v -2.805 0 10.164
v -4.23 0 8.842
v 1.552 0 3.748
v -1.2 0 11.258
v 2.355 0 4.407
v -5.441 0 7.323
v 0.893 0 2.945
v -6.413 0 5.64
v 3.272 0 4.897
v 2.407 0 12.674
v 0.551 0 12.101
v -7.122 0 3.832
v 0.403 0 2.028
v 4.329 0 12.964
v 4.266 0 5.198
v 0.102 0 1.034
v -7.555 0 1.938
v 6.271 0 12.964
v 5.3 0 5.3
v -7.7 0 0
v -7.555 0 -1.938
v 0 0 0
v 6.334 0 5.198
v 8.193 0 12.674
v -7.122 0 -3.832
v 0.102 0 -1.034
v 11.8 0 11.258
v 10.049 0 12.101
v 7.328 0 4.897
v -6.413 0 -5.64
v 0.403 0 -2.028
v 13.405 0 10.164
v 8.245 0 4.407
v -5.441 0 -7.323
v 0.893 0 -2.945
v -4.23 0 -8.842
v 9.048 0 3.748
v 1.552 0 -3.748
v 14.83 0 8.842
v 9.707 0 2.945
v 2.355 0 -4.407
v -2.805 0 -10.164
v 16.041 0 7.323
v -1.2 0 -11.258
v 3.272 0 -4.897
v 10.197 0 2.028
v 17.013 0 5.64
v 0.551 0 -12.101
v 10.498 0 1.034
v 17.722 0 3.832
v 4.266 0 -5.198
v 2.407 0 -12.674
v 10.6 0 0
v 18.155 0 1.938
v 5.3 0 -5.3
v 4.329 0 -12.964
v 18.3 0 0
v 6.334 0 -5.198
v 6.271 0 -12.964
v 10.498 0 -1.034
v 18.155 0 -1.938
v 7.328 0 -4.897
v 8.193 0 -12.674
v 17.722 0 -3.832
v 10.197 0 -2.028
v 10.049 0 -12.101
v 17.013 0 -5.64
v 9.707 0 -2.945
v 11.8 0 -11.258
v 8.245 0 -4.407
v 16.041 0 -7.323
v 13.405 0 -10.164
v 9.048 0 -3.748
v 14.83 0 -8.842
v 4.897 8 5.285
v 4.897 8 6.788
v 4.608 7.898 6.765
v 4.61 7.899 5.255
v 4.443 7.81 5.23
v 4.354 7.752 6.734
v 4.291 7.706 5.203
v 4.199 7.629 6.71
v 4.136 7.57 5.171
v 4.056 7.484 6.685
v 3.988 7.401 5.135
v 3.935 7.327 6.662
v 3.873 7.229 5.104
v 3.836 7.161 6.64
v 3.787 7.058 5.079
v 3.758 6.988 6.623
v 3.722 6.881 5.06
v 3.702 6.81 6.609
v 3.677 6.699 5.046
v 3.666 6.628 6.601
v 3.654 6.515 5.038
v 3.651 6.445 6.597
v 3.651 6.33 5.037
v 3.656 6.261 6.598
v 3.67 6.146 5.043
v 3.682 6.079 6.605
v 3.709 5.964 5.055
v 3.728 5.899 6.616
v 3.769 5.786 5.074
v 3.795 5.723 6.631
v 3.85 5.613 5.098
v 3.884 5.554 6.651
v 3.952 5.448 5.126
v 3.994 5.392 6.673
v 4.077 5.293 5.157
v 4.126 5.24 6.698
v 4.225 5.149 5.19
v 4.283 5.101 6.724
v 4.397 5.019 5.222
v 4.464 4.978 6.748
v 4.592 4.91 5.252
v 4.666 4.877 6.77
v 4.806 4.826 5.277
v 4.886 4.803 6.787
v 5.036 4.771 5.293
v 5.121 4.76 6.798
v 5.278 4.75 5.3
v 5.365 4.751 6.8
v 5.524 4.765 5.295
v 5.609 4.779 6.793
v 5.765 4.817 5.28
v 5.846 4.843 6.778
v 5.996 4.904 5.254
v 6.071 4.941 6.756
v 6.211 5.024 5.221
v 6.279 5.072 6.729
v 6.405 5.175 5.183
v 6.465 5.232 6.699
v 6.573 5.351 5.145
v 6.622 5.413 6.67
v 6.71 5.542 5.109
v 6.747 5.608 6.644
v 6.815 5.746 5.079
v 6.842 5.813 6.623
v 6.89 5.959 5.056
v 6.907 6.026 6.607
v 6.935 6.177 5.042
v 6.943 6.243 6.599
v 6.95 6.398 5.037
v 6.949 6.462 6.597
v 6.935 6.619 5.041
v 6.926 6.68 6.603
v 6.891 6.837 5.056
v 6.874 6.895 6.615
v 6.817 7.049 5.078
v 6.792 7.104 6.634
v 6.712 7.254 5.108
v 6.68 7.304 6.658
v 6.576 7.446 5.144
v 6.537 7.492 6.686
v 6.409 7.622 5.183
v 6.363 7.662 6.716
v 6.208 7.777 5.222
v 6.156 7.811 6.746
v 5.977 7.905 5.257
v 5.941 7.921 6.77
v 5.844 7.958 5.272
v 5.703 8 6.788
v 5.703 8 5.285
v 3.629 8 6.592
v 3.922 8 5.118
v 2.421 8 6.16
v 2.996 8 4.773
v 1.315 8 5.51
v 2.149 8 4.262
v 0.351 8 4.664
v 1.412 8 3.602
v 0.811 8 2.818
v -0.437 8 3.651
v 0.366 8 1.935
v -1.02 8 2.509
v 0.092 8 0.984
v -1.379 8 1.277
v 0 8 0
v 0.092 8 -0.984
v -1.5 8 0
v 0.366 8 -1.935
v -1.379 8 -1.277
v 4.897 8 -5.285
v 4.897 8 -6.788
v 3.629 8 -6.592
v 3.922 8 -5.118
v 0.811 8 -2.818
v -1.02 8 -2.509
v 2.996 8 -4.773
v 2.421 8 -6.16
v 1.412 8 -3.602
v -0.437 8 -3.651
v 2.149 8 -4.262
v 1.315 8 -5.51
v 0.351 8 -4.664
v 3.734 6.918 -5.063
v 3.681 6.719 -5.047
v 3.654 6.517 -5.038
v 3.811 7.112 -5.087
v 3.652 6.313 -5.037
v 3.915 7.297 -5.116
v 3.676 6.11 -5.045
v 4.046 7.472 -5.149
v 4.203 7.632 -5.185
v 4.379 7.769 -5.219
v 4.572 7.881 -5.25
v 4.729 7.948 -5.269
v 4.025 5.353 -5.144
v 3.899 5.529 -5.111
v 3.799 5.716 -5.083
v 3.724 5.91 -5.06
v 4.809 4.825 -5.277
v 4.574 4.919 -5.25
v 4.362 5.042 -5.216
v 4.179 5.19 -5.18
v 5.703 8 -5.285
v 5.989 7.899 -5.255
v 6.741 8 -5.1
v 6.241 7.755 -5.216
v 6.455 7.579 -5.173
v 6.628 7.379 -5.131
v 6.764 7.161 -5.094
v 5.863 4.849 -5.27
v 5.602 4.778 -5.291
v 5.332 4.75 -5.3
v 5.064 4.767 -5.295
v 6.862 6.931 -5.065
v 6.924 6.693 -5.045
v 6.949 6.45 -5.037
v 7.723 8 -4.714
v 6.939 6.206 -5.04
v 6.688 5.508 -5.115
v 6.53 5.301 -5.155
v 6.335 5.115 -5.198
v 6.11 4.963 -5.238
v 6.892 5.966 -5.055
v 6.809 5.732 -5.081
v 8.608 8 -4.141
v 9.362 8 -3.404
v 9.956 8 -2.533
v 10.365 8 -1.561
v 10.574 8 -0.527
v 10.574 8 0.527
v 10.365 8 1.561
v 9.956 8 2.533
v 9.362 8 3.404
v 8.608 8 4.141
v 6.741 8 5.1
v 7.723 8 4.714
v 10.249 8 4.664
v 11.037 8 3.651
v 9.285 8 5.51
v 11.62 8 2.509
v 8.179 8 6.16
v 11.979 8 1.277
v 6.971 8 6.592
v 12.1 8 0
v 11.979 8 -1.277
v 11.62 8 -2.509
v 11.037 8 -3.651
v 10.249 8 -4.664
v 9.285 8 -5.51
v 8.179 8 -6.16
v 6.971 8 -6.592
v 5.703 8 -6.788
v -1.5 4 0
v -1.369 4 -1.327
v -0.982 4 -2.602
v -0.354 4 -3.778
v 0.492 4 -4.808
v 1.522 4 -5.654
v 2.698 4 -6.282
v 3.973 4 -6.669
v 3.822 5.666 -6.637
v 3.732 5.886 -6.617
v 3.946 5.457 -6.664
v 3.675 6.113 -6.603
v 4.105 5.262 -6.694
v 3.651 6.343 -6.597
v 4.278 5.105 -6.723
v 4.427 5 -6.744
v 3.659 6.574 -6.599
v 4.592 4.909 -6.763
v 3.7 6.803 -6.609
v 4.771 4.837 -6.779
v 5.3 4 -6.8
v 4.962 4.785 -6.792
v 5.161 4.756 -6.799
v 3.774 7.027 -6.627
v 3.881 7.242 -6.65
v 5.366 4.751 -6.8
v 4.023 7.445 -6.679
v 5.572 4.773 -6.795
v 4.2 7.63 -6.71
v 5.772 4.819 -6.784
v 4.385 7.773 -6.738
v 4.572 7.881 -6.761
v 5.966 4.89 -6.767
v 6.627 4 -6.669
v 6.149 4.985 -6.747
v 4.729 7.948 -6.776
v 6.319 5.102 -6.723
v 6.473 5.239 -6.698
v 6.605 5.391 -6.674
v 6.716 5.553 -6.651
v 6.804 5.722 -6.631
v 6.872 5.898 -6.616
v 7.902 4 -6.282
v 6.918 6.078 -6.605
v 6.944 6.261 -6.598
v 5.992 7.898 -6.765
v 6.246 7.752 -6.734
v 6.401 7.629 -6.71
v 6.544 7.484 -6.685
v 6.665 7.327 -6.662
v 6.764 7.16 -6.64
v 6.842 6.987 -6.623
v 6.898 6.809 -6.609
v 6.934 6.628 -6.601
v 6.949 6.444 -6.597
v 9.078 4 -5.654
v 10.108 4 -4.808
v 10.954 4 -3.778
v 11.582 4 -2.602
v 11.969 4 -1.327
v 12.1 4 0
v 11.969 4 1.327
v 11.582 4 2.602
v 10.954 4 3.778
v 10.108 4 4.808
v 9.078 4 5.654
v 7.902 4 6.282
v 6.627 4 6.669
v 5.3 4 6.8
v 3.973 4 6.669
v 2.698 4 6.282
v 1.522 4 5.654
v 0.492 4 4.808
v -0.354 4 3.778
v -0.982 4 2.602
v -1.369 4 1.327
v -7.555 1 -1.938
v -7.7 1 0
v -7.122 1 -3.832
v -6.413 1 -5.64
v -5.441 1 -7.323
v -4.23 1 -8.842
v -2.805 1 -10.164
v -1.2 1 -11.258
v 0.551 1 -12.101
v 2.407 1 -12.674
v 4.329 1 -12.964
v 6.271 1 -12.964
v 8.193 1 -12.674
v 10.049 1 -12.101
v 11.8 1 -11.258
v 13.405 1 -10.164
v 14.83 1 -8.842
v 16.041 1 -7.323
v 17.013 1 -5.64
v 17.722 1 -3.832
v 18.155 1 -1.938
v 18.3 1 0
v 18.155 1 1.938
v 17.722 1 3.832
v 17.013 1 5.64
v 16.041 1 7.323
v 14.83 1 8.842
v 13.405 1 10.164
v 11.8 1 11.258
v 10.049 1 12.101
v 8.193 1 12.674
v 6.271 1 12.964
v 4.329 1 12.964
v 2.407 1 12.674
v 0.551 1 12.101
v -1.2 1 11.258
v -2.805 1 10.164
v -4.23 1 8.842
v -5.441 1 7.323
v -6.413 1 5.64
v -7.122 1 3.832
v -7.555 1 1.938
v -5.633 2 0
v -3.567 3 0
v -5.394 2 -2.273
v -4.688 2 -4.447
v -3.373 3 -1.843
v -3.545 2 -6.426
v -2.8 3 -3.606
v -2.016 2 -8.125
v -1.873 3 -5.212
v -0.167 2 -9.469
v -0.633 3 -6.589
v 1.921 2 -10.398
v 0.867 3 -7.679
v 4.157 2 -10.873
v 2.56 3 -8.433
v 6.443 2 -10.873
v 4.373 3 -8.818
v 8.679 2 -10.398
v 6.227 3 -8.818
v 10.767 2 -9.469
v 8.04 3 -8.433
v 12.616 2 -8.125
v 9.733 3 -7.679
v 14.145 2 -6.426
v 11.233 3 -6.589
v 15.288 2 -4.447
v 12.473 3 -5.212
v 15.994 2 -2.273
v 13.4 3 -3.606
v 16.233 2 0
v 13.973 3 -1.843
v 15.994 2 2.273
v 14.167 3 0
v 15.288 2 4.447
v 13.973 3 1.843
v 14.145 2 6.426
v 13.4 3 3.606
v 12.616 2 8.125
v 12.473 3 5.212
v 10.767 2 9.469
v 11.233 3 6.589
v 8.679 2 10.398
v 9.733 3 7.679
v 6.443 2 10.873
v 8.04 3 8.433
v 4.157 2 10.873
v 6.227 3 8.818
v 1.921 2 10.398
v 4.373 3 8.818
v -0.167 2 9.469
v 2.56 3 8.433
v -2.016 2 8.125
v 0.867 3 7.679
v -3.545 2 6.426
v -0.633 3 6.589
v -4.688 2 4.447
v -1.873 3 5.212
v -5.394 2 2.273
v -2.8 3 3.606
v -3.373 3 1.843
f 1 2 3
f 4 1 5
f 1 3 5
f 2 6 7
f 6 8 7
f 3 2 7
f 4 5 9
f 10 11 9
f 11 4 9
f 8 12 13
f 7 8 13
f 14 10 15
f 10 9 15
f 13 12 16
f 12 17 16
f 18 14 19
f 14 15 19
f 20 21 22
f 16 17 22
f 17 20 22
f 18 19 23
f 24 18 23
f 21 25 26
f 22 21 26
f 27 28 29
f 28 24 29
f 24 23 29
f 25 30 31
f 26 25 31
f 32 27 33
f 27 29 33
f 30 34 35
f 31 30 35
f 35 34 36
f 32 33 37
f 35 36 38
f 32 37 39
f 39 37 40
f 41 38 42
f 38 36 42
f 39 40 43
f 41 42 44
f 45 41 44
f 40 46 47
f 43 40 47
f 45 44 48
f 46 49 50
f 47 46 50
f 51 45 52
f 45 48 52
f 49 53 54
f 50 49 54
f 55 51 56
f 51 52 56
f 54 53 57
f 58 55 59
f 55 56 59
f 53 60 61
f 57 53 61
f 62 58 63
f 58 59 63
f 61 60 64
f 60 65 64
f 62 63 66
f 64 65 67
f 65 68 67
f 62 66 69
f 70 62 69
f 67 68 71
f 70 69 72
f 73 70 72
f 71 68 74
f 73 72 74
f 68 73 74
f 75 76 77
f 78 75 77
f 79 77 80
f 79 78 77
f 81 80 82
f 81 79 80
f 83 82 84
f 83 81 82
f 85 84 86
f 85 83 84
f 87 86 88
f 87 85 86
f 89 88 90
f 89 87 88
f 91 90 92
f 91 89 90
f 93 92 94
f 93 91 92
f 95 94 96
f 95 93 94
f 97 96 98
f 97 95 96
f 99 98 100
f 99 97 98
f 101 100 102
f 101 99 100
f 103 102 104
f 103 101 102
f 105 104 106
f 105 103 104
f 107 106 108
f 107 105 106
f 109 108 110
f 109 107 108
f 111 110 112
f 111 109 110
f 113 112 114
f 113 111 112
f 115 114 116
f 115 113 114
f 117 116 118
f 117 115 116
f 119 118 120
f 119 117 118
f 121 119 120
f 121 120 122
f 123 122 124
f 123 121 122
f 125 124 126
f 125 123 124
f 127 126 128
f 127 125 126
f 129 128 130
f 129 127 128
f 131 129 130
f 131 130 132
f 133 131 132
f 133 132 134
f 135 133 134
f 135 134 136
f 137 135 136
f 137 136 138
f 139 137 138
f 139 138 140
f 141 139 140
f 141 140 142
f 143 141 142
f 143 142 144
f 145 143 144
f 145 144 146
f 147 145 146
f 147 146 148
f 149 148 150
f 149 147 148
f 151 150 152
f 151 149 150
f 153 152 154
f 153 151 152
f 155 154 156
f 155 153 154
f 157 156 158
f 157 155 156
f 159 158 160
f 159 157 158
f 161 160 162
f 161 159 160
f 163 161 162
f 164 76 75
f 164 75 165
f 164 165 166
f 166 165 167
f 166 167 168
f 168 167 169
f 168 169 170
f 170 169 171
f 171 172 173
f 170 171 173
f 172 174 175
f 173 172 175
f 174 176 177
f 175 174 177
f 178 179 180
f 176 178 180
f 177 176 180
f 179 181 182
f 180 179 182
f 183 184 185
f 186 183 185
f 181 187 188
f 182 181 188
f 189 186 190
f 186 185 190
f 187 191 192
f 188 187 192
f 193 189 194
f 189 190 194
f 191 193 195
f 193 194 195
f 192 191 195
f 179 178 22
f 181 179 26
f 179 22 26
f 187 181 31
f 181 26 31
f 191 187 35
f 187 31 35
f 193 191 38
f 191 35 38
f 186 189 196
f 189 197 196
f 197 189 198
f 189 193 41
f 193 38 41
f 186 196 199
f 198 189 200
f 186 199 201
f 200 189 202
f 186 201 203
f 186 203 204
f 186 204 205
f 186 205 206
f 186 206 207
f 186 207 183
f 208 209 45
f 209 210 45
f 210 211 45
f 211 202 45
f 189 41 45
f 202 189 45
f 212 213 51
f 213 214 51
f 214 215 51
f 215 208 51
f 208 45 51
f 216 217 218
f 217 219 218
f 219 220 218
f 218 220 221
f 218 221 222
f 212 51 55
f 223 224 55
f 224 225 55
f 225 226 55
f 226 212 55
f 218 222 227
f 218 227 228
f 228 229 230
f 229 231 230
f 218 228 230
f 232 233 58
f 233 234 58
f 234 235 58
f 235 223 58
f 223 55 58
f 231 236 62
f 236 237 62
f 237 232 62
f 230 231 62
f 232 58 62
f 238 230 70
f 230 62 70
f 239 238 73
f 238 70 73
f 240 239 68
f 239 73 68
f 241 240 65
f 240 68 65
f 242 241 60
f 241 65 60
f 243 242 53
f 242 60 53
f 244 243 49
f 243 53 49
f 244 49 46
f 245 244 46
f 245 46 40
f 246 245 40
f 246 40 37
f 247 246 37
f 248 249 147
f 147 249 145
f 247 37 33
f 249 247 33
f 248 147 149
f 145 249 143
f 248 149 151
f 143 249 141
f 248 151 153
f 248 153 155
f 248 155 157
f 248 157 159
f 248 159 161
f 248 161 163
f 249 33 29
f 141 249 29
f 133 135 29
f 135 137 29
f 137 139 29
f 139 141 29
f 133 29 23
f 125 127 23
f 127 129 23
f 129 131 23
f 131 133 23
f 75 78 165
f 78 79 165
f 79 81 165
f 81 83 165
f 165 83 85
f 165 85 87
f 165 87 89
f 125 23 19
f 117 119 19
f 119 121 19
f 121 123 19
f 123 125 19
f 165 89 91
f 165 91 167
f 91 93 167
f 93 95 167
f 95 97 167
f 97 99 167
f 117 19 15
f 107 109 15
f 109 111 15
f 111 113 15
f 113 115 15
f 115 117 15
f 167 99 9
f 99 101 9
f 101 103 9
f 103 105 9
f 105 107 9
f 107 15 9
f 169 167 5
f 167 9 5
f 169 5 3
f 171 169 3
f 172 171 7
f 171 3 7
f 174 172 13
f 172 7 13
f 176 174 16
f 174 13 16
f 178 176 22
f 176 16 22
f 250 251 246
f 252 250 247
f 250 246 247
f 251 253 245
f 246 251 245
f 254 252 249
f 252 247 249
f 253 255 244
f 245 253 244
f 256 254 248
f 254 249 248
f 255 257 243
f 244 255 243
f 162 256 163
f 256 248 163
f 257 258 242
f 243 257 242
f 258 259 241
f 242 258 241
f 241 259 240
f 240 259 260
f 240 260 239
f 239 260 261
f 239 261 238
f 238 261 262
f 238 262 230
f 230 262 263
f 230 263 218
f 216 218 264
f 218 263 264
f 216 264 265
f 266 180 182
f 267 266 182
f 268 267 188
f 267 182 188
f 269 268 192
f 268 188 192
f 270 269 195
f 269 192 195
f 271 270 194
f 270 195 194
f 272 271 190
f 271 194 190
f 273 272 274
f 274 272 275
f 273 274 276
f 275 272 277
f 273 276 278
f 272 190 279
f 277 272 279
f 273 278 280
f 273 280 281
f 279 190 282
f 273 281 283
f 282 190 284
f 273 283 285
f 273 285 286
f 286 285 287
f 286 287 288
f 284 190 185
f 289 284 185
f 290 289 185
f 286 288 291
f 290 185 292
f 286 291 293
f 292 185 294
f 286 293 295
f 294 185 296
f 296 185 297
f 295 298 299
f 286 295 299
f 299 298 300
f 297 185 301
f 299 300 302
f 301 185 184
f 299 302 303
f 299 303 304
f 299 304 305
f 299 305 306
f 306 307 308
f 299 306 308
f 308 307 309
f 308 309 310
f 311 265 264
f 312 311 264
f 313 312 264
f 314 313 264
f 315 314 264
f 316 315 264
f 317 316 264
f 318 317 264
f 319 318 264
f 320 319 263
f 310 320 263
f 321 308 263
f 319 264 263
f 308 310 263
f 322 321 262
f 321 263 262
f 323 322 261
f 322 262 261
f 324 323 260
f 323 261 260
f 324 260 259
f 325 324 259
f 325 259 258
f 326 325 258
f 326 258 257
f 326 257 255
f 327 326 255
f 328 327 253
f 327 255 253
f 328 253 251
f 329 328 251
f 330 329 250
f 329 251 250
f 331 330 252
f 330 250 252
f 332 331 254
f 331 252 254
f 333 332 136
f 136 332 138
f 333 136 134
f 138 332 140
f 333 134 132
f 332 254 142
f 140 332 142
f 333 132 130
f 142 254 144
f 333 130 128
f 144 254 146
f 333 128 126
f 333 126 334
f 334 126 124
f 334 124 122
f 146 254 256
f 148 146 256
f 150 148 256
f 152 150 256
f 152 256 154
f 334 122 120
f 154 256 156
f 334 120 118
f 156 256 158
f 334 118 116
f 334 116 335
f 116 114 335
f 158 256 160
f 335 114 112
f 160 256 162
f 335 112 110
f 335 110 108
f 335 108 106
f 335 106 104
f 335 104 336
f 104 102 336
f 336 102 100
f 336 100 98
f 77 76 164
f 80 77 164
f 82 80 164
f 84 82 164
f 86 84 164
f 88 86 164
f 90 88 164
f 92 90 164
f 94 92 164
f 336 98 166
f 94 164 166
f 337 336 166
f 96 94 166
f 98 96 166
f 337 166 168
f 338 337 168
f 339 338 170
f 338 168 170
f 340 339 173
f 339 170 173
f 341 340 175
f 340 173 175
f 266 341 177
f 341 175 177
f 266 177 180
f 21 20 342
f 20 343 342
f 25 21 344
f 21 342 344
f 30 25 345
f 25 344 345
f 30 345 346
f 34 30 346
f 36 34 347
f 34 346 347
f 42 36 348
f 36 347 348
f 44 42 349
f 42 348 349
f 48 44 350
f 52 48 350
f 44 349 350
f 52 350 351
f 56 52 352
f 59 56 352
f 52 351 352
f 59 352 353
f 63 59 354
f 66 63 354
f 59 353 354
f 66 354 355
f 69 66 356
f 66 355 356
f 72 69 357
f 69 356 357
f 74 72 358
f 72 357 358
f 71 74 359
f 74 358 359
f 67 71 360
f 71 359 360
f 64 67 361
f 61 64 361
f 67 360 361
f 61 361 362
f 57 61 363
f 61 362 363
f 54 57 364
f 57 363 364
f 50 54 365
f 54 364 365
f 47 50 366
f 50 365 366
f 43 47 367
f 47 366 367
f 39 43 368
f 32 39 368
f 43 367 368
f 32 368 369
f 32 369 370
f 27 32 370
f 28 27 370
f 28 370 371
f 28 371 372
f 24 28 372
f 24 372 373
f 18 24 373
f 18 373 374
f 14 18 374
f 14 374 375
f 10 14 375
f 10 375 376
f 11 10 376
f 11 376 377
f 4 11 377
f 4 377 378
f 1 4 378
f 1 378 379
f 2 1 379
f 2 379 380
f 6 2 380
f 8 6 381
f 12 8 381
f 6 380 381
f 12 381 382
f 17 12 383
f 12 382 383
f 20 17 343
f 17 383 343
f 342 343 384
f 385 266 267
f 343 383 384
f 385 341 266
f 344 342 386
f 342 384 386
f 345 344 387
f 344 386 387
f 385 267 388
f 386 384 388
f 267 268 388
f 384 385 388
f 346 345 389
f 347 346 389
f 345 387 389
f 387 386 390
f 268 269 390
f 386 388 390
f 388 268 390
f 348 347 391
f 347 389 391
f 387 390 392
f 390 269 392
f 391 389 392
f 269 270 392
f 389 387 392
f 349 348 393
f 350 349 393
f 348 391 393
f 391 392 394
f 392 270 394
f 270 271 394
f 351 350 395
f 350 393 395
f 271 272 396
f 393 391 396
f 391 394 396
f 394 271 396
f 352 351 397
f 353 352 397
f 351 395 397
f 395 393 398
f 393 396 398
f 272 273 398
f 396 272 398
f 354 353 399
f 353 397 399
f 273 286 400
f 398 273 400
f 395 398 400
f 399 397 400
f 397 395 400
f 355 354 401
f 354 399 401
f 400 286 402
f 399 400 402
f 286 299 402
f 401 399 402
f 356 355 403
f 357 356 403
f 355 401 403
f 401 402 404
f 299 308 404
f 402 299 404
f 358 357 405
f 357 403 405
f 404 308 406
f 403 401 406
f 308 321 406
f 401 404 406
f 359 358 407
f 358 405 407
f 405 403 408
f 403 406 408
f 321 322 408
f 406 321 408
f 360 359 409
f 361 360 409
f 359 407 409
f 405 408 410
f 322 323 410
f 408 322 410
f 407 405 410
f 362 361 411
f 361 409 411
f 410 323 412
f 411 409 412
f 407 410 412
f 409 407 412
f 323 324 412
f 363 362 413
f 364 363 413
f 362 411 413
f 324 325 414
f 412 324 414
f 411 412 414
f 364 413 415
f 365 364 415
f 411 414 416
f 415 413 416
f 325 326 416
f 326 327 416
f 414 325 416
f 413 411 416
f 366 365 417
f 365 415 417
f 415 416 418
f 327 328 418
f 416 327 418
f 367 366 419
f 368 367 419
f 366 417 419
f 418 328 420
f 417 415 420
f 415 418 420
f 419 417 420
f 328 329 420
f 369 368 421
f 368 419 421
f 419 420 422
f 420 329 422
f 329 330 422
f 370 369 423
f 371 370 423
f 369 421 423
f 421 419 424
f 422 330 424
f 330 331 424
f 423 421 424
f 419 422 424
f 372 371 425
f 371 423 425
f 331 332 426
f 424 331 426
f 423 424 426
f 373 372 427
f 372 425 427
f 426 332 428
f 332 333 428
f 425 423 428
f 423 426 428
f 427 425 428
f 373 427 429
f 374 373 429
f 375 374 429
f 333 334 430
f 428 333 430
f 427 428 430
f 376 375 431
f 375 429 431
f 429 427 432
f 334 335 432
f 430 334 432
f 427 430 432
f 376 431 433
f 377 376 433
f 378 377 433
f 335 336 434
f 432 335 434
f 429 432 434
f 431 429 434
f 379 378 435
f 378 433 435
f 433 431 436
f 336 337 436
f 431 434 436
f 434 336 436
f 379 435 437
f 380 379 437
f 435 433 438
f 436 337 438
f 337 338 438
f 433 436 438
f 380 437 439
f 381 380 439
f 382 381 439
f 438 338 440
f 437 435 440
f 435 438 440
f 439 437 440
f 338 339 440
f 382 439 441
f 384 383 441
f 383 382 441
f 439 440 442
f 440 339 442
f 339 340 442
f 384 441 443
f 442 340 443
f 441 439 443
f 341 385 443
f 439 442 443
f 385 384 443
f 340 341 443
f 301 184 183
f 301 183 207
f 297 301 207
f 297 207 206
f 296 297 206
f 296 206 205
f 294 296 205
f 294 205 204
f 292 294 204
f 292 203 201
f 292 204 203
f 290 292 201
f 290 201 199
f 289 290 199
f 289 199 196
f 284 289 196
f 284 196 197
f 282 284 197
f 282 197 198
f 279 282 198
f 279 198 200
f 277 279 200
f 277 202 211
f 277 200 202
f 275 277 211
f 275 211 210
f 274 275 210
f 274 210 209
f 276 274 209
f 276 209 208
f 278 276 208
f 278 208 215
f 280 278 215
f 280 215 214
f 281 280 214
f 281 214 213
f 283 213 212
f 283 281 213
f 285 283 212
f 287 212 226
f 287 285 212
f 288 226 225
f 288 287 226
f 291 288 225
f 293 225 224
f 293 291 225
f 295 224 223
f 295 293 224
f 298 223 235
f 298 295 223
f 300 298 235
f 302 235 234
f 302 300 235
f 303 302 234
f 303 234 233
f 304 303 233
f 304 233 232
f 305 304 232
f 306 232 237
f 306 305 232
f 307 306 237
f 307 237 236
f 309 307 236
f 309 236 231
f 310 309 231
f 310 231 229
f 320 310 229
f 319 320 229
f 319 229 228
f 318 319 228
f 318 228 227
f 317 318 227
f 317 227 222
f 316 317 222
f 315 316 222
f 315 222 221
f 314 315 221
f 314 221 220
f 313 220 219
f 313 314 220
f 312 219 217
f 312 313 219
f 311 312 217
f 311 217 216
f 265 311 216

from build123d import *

# Parameters (mm, degrees)
CUT_EXTRUDE_3_DEPTH      = 10
CUT_EXTRUDE_3_DEPTH_BACK = 10
SKETCH_2_R               = 1.65


with BuildPart() as part:
    # 草图1 → 旋转1 (revolve)
    with BuildSketch(Plane.XY):
        Polygon((0, 0), (-7.7, 0), (-7.7, 1), (-1.5, 4), (-1.5, 8), (0, 8), align=None)
    revolve(axis=Axis((5.3, 12.989187483, 0), (0, -1, 0)))

    # 草图2 → 切除-拉伸3 (cut, two sides: drawn at the far end of the back side and taken through both)
    with BuildSketch(Plane.XY.offset(-CUT_EXTRUDE_3_DEPTH_BACK)):
        with Locations((5.3, 6.4)):
            Circle(SKETCH_2_R)
    extrude(amount=CUT_EXTRUDE_3_DEPTH + CUT_EXTRUDE_3_DEPTH_BACK, mode=Mode.SUBTRACT)


solid = part.part
